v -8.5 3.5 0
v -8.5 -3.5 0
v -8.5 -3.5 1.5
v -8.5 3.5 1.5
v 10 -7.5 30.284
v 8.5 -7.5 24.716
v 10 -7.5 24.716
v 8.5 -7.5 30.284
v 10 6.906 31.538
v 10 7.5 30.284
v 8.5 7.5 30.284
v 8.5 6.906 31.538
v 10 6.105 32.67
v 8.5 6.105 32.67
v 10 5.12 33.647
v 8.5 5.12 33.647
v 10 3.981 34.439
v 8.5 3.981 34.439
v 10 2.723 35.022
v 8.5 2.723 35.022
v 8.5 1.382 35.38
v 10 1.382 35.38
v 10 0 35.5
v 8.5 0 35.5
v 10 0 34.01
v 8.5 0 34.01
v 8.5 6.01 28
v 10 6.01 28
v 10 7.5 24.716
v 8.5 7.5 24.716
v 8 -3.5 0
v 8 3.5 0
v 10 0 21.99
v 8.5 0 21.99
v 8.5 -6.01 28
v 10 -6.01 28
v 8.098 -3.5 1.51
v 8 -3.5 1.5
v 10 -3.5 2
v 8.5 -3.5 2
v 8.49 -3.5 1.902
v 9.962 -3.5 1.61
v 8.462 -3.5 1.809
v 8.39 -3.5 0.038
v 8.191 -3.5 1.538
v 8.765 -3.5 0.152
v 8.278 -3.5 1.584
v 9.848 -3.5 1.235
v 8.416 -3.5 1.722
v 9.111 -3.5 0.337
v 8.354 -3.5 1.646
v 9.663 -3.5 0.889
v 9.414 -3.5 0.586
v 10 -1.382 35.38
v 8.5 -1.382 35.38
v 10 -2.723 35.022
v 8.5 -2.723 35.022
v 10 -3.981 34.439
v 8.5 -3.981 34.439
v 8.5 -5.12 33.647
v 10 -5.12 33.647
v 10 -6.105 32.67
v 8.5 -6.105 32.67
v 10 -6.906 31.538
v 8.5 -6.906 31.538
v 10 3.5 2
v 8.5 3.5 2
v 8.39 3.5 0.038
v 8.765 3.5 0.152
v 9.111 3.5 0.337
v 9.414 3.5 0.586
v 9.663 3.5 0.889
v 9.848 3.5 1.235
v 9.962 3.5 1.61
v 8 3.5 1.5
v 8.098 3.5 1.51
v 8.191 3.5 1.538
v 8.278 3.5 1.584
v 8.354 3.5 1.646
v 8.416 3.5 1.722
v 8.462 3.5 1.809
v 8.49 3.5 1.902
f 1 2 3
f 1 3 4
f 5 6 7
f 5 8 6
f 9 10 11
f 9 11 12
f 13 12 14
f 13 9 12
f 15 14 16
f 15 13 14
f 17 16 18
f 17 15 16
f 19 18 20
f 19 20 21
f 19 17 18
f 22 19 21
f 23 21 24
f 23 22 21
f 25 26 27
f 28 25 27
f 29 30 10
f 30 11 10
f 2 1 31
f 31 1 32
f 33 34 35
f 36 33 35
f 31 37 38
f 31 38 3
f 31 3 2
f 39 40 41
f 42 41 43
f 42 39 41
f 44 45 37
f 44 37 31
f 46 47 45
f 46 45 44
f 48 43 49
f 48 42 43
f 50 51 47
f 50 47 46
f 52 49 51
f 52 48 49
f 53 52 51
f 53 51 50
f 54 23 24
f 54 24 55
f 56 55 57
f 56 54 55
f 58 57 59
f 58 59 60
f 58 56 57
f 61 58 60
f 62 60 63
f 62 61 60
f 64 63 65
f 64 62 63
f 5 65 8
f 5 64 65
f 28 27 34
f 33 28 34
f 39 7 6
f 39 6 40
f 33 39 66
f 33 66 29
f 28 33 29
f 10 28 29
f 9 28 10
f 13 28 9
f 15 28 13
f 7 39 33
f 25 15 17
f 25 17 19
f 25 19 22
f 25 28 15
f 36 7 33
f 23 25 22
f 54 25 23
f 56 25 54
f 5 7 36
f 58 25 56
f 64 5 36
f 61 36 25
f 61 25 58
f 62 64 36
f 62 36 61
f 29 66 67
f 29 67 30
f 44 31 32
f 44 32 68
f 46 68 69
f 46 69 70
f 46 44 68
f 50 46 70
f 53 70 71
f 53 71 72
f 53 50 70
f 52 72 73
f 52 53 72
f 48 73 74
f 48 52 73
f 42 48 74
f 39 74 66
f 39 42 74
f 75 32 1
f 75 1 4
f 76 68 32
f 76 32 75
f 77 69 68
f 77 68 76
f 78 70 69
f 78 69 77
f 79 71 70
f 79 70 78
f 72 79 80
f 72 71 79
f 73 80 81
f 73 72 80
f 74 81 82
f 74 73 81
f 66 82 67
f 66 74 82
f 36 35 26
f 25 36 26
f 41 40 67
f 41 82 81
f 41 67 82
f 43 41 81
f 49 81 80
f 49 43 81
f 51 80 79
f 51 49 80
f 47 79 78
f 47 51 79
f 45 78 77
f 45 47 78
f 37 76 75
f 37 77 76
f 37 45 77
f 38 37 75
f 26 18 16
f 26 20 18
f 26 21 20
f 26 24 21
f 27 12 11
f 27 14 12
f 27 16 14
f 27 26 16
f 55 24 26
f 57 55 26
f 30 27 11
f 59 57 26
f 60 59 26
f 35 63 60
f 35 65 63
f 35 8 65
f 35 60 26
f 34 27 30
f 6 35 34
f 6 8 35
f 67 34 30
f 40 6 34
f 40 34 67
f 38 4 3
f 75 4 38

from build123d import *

# Parameters (mm, degrees)
SKETCH_2_W                       = 17
SKETCH_2_H                       = 15
SM_BASE_FLANGE_1_DEPTH           = 1.5
SM_EDGE_FLANGE_1_STRIP_W         = 7
SM_EDGE_FLANGE_1_STRIP_H         = 1.5
SM_EDGE_FLANGE_1_STRIP_CUT_DEPTH = 15
SM_EDGE_FLANGE_1_DEPTH           = 15
CUT_EXTRUDE_4_DEPTH              = 2
CUT_EXTRUDE_START                = -1.5
CUT_EXTRUDE_5_DEPTH              = 18.5


# Read off the part's stored shape, not the designer's step: 切除-拉伸5
# Sheet-metal steps are written as plain solids
with BuildPart() as part:
    # 草图2 → 基体-法兰1 (new body)
    with BuildSketch(Plane.XY):
        Rectangle(SKETCH_2_W, SKETCH_2_H)
    extrude(amount=SM_BASE_FLANGE_1_DEPTH)

    # 边线-法兰1 strip (across the edge) → 边线-法兰1 strip cut (cut)
    with BuildSketch(Plane(origin=(8.5, -7.5, 1.5), x_dir=(-1, 0, 0), z_dir=(0, 1, 0))):
        with Locations((-3, -0.75)):
            Rectangle(SM_EDGE_FLANGE_1_STRIP_W, SM_EDGE_FLANGE_1_STRIP_H)
    extrude(amount=SM_EDGE_FLANGE_1_STRIP_CUT_DEPTH, mode=Mode.SUBTRACT)

    # 边线-法兰1 section (across the edge) → 边线-法兰1 (add)
    with BuildSketch(Plane(origin=(8.5, -7.5, 1.5), x_dir=(-1, 0, 0), z_dir=(0, 1, 0))):
        with BuildLine():
            Line((-1.5, 0.5), (-1.5, 34))
            Line((-1.5, 34), (0, 34))
            Line((0, 34), (0, 0.5))
            ThreePointArc((0, 0.5), (0.146446609, 0.146446609), (0.5, 0))
            Line((0.5, 0), (0.5, -1.5))
            ThreePointArc((0.5, -1.5), (-0.914213562, -0.914213562), (-1.5, 0.5))
        make_face()
    extrude(amount=SM_EDGE_FLANGE_1_DEPTH)

    # 草图17 → 切除-拉伸4 (cut)
    with BuildSketch(Plane(origin=(8.5, 0, 0.26211679), x_dir=(0, 0, 1), z_dir=(-1, 0, 0))):
        Polygon((27.73788321, 6.01040764), (21.72747557, 0), (27.73788321, -6.01040764), (33.74829085, 0), align=None)
    extrude(amount=-CUT_EXTRUDE_4_DEPTH, mode=Mode.SUBTRACT)

    # 切除-拉伸5 outline → 切除-拉伸5 (cut)
    with BuildSketch(Plane(origin=(8.5, 0, 0.26211679), x_dir=(0, 0, 1), z_dir=(-1, 0, 0)).offset(CUT_EXTRUDE_START)):
        Polygon((1.73788321, 3.5), (24.454001029, 7.5), (-0.26211679, 7.5), (-0.26211679, 3.5), align=None)
        with BuildLine():
            Line((35.23788321, 7.5), (30.021765392, 7.5))
            ThreePointArc((30.021765392, 7.5), (33.805647573, 4.567764363), (35.23788321, 0))
            Line((35.23788321, 0), (35.23788321, 7.5))
        make_face()
        with BuildLine():
            Line((35.23788321, -7.5), (35.23788321, 0))
            ThreePointArc((35.23788321, 0), (33.805647573, -4.567764363), (30.021765392, -7.5))
            Line((30.021765392, -7.5), (35.23788321, -7.5))
        make_face()
        Polygon((-0.26211679, -7.5), (24.454001029, -7.5), (1.73788321, -3.5), (-0.26211679, -3.5), align=None)
    extrude(amount=CUT_EXTRUDE_5_DEPTH, mode=Mode.SUBTRACT)


solid = part.part
